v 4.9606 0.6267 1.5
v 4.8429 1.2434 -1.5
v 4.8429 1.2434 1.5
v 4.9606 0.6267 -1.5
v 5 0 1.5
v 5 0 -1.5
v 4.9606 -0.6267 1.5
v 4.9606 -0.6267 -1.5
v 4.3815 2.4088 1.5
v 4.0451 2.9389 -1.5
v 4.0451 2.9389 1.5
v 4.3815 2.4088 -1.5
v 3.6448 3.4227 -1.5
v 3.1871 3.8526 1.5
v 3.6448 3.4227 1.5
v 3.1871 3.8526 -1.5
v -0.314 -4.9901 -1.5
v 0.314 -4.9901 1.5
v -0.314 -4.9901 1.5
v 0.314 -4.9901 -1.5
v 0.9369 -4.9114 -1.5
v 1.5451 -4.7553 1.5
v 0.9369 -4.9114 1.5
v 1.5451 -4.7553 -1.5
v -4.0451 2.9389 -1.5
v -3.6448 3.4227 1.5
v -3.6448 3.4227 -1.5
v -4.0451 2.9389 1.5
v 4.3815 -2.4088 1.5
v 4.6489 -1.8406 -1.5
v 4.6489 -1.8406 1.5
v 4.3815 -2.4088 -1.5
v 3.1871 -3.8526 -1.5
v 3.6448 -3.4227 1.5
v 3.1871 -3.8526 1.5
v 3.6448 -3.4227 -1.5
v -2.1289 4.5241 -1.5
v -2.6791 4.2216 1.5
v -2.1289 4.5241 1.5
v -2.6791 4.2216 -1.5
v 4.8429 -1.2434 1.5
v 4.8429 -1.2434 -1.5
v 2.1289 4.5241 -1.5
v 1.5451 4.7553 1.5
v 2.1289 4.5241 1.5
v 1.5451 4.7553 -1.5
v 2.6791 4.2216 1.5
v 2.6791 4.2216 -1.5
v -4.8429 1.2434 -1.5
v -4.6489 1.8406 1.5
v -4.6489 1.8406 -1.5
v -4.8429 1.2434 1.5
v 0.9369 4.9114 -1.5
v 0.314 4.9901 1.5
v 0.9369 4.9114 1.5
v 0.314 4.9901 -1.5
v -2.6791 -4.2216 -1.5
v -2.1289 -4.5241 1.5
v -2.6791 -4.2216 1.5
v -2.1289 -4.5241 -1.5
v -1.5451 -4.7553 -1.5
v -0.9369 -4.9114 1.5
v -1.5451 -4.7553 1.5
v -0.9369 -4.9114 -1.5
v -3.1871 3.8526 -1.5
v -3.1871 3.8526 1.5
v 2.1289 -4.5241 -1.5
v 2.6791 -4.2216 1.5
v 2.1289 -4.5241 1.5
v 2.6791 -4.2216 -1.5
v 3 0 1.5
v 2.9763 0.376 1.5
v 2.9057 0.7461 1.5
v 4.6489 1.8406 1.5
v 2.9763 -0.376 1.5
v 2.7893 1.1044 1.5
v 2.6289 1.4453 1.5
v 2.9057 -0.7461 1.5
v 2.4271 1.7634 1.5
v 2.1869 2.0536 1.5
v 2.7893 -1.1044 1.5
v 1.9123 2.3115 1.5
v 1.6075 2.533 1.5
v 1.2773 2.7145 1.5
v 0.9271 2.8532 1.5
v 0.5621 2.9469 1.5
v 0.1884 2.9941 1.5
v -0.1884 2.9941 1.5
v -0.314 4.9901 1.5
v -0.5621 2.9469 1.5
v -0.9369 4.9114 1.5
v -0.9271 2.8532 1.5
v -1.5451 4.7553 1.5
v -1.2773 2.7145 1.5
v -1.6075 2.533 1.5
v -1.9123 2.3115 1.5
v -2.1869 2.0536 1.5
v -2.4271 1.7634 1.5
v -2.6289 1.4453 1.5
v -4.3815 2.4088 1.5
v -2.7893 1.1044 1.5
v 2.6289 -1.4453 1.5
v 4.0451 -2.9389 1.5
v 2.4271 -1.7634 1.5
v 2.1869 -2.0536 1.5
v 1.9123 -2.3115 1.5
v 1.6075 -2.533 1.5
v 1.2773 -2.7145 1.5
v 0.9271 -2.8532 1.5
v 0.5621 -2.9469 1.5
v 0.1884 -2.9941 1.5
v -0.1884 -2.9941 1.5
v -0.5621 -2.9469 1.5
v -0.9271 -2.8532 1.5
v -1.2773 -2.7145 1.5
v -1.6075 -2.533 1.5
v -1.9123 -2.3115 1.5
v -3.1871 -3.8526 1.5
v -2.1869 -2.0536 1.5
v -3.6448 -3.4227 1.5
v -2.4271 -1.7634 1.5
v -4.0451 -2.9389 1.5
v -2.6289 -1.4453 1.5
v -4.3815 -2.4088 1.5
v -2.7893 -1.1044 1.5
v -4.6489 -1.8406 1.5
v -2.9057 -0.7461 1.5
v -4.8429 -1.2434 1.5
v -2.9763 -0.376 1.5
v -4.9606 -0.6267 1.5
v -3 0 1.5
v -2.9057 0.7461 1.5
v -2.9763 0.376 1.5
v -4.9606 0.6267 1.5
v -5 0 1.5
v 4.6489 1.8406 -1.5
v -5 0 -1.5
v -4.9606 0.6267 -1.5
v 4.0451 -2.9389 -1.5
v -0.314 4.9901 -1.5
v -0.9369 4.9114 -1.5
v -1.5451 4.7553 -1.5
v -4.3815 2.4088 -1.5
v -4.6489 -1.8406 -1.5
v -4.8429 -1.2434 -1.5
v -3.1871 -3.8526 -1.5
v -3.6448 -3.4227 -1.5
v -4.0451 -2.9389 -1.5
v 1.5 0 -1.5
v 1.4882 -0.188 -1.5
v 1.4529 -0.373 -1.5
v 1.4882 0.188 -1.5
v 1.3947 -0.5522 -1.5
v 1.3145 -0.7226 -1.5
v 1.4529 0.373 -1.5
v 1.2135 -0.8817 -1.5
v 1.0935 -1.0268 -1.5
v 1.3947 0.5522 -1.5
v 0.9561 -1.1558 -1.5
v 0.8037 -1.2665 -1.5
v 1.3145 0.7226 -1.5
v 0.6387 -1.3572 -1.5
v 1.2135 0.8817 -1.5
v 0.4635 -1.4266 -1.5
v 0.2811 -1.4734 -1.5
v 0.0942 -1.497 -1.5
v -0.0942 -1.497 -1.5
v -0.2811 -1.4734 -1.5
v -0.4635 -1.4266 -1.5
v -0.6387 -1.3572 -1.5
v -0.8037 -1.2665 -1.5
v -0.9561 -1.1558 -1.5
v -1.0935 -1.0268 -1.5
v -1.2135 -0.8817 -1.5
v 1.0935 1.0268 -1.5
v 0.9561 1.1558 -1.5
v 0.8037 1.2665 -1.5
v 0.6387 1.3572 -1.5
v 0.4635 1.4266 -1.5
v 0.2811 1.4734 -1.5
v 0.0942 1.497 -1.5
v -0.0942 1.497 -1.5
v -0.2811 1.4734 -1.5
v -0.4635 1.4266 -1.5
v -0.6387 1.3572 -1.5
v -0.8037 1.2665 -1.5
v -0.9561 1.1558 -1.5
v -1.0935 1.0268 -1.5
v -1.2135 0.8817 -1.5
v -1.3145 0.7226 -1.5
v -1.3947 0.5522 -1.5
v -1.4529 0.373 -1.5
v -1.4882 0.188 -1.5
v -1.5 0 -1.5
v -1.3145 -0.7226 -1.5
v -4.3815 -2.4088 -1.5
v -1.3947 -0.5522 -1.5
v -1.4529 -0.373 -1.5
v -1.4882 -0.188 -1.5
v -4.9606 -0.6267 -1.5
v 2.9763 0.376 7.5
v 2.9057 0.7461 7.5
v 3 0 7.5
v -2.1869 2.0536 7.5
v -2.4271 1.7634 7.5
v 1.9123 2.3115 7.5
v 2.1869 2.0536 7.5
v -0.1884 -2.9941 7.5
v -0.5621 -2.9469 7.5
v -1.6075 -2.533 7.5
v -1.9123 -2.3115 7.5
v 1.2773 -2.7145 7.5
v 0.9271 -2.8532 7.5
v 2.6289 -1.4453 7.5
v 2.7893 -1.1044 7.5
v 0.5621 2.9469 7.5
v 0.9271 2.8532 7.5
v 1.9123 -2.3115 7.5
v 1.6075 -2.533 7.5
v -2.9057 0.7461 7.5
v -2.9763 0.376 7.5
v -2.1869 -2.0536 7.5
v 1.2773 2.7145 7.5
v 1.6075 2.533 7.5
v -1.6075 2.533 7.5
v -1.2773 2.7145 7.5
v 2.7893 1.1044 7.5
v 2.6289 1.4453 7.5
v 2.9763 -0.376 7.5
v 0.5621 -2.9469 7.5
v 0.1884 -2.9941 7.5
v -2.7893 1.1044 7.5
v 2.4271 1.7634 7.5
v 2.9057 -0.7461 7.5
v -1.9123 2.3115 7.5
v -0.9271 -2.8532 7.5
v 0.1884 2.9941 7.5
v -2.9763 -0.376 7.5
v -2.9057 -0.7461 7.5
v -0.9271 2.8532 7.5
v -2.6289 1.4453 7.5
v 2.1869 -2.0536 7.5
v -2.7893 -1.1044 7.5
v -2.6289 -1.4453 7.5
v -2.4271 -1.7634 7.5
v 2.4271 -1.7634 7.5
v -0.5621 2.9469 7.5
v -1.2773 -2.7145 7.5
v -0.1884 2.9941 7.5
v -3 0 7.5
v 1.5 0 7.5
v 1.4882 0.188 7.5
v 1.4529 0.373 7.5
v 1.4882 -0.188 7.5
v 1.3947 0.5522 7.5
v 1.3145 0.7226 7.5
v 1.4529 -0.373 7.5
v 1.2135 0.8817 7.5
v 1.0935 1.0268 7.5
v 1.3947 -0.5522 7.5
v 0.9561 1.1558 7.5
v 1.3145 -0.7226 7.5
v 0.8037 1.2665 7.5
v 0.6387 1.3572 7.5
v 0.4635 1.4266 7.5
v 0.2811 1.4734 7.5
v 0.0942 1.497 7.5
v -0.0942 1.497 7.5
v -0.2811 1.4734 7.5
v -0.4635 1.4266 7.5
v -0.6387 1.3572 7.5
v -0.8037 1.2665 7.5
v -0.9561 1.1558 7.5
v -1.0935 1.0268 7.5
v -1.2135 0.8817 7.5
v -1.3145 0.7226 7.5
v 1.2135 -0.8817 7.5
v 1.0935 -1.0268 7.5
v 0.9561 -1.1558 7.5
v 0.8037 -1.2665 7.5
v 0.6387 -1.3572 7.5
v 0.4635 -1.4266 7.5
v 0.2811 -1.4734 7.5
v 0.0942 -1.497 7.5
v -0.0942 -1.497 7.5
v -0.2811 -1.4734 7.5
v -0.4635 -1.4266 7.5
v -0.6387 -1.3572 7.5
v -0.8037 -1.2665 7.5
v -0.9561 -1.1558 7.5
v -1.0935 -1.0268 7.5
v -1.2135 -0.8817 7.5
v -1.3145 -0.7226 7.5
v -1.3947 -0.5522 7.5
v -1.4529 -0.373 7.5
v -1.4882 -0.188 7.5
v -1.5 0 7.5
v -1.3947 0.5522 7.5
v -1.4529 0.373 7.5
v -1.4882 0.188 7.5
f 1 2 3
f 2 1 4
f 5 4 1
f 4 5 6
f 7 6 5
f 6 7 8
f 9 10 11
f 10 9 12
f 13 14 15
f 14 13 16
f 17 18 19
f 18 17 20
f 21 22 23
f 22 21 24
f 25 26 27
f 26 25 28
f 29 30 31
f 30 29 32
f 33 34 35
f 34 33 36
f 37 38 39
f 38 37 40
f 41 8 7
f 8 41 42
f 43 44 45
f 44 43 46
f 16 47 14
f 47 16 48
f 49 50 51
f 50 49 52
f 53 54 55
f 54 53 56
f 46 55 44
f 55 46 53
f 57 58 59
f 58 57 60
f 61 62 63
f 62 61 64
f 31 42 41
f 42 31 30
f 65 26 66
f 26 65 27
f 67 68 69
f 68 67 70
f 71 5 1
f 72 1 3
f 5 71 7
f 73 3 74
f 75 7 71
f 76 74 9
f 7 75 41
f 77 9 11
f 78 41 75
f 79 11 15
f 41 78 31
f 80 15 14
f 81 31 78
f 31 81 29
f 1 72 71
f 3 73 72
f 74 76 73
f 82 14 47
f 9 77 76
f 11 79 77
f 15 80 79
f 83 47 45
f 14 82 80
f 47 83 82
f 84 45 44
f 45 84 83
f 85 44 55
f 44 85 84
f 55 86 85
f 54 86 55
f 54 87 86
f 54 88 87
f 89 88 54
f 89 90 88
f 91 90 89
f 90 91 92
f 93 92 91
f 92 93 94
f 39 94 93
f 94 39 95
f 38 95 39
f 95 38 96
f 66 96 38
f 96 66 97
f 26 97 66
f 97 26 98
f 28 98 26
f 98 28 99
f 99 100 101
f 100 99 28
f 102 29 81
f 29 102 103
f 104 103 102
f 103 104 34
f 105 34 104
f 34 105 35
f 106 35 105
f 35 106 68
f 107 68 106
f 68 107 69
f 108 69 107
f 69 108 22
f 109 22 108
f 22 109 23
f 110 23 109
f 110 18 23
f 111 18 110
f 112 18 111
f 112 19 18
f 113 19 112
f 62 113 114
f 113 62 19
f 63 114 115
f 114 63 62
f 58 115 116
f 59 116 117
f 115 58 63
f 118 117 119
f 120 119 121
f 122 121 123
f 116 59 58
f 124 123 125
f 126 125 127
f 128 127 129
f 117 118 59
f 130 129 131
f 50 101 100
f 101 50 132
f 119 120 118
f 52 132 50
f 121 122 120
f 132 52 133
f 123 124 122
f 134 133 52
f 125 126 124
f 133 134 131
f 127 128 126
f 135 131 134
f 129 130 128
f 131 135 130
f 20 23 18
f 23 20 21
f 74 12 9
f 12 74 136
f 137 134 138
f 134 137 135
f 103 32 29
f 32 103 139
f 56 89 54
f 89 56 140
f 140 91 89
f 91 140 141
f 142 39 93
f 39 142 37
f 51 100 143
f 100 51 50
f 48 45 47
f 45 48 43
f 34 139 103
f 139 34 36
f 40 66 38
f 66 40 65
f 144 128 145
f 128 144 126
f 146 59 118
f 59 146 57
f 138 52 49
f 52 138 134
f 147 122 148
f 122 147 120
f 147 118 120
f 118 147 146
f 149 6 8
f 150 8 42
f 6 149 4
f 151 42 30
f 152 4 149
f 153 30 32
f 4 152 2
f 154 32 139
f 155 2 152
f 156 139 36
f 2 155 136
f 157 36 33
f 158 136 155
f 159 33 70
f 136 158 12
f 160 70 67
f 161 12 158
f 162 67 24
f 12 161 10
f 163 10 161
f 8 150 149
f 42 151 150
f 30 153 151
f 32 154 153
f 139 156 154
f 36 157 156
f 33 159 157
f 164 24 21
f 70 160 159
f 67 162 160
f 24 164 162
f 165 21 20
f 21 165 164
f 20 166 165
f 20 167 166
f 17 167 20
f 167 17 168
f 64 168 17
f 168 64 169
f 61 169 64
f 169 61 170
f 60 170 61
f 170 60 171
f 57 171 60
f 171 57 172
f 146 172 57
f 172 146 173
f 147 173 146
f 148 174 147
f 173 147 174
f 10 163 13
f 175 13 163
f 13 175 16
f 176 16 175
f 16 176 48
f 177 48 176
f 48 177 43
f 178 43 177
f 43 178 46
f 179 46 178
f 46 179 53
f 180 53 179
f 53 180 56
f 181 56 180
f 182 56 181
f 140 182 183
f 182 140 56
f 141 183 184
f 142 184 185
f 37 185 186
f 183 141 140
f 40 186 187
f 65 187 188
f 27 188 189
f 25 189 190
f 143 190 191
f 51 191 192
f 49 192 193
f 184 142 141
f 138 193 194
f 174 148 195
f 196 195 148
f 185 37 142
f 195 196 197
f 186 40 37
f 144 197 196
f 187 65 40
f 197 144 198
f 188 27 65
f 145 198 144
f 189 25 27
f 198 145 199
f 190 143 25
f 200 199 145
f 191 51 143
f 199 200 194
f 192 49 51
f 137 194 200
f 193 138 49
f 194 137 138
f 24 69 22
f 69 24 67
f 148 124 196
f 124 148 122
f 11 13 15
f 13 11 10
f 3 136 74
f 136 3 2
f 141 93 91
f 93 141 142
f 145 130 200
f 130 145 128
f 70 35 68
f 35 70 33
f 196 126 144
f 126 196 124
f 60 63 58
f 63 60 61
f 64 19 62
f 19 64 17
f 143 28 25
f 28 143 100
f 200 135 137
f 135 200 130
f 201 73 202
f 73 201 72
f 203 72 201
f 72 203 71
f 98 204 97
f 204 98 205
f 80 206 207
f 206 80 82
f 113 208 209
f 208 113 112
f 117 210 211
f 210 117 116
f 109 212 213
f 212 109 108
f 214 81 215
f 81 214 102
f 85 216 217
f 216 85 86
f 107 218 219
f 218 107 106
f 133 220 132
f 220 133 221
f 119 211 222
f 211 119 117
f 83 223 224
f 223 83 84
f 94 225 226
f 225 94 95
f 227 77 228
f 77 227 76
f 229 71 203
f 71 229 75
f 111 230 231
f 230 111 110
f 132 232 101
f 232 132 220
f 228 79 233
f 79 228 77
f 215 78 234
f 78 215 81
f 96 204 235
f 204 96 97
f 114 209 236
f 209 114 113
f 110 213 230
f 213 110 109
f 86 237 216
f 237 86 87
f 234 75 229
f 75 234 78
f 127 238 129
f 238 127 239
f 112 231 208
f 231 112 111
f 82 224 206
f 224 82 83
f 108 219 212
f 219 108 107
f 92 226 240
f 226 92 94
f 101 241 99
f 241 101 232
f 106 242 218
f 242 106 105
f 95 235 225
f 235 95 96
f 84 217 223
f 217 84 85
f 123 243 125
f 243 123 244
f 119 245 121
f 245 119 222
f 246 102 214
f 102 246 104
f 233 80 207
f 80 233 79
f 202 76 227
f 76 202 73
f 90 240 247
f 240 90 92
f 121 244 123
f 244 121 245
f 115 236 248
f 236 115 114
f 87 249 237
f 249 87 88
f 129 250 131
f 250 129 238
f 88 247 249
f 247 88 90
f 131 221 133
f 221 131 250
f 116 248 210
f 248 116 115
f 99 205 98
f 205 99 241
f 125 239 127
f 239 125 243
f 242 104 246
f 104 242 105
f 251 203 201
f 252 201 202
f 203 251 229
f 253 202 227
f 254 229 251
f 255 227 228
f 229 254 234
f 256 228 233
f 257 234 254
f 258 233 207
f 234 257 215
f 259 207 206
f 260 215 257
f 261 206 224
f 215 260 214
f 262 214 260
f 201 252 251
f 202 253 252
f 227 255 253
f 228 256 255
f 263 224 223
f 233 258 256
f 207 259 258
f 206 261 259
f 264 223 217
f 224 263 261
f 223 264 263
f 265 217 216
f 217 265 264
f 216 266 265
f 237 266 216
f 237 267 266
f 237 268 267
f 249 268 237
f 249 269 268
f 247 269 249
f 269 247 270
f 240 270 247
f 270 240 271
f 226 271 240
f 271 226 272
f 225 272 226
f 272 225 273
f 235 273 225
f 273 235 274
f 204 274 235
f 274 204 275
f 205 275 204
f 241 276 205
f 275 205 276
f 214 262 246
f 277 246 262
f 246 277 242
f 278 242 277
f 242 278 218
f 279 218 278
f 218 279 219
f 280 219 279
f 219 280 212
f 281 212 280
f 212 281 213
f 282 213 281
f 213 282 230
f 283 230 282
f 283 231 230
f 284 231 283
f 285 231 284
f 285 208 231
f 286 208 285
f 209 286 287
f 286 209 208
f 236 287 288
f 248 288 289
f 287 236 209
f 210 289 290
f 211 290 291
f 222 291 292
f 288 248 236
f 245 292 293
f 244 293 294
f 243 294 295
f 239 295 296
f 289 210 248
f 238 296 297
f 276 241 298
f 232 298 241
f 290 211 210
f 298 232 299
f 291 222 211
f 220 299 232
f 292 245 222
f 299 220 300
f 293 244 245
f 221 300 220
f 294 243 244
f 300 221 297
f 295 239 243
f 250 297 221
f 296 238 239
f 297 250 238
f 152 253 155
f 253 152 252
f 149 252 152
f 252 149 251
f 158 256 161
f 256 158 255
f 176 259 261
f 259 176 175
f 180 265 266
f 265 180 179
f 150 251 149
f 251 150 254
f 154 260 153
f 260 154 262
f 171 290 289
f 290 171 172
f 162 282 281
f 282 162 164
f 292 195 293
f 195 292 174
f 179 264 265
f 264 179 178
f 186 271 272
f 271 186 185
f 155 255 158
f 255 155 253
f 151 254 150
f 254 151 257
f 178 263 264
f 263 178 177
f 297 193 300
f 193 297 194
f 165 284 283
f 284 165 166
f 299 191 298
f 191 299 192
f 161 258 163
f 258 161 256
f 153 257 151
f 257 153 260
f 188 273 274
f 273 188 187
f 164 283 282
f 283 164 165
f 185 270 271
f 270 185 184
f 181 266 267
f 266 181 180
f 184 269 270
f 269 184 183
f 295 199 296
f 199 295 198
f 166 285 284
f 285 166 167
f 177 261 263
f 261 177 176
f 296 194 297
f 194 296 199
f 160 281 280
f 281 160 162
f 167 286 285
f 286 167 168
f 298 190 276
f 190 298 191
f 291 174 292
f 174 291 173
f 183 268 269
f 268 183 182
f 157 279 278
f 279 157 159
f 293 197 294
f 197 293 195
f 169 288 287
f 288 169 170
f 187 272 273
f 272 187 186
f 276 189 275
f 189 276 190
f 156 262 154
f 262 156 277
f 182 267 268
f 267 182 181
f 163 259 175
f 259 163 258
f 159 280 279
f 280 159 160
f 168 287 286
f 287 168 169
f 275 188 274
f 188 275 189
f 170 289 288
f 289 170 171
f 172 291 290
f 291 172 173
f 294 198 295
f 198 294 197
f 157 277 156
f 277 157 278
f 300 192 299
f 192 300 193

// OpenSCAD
$fn = 50;


difference() {
	union() {
		translate(v = [0, 0, -1.5000000000]) {
			cylinder(h = 3, r = 5.0000000000);
		}
		translate(v = [0, 0, -1.5000000000]) {
			cylinder(h = 9, r = 3.0000000000);
		}
	}
	union() {
		translate(v = [0, 0, -50.0000000000]) {
			cylinder(h = 100, r = 1.5000000000);
		}
	}
}
